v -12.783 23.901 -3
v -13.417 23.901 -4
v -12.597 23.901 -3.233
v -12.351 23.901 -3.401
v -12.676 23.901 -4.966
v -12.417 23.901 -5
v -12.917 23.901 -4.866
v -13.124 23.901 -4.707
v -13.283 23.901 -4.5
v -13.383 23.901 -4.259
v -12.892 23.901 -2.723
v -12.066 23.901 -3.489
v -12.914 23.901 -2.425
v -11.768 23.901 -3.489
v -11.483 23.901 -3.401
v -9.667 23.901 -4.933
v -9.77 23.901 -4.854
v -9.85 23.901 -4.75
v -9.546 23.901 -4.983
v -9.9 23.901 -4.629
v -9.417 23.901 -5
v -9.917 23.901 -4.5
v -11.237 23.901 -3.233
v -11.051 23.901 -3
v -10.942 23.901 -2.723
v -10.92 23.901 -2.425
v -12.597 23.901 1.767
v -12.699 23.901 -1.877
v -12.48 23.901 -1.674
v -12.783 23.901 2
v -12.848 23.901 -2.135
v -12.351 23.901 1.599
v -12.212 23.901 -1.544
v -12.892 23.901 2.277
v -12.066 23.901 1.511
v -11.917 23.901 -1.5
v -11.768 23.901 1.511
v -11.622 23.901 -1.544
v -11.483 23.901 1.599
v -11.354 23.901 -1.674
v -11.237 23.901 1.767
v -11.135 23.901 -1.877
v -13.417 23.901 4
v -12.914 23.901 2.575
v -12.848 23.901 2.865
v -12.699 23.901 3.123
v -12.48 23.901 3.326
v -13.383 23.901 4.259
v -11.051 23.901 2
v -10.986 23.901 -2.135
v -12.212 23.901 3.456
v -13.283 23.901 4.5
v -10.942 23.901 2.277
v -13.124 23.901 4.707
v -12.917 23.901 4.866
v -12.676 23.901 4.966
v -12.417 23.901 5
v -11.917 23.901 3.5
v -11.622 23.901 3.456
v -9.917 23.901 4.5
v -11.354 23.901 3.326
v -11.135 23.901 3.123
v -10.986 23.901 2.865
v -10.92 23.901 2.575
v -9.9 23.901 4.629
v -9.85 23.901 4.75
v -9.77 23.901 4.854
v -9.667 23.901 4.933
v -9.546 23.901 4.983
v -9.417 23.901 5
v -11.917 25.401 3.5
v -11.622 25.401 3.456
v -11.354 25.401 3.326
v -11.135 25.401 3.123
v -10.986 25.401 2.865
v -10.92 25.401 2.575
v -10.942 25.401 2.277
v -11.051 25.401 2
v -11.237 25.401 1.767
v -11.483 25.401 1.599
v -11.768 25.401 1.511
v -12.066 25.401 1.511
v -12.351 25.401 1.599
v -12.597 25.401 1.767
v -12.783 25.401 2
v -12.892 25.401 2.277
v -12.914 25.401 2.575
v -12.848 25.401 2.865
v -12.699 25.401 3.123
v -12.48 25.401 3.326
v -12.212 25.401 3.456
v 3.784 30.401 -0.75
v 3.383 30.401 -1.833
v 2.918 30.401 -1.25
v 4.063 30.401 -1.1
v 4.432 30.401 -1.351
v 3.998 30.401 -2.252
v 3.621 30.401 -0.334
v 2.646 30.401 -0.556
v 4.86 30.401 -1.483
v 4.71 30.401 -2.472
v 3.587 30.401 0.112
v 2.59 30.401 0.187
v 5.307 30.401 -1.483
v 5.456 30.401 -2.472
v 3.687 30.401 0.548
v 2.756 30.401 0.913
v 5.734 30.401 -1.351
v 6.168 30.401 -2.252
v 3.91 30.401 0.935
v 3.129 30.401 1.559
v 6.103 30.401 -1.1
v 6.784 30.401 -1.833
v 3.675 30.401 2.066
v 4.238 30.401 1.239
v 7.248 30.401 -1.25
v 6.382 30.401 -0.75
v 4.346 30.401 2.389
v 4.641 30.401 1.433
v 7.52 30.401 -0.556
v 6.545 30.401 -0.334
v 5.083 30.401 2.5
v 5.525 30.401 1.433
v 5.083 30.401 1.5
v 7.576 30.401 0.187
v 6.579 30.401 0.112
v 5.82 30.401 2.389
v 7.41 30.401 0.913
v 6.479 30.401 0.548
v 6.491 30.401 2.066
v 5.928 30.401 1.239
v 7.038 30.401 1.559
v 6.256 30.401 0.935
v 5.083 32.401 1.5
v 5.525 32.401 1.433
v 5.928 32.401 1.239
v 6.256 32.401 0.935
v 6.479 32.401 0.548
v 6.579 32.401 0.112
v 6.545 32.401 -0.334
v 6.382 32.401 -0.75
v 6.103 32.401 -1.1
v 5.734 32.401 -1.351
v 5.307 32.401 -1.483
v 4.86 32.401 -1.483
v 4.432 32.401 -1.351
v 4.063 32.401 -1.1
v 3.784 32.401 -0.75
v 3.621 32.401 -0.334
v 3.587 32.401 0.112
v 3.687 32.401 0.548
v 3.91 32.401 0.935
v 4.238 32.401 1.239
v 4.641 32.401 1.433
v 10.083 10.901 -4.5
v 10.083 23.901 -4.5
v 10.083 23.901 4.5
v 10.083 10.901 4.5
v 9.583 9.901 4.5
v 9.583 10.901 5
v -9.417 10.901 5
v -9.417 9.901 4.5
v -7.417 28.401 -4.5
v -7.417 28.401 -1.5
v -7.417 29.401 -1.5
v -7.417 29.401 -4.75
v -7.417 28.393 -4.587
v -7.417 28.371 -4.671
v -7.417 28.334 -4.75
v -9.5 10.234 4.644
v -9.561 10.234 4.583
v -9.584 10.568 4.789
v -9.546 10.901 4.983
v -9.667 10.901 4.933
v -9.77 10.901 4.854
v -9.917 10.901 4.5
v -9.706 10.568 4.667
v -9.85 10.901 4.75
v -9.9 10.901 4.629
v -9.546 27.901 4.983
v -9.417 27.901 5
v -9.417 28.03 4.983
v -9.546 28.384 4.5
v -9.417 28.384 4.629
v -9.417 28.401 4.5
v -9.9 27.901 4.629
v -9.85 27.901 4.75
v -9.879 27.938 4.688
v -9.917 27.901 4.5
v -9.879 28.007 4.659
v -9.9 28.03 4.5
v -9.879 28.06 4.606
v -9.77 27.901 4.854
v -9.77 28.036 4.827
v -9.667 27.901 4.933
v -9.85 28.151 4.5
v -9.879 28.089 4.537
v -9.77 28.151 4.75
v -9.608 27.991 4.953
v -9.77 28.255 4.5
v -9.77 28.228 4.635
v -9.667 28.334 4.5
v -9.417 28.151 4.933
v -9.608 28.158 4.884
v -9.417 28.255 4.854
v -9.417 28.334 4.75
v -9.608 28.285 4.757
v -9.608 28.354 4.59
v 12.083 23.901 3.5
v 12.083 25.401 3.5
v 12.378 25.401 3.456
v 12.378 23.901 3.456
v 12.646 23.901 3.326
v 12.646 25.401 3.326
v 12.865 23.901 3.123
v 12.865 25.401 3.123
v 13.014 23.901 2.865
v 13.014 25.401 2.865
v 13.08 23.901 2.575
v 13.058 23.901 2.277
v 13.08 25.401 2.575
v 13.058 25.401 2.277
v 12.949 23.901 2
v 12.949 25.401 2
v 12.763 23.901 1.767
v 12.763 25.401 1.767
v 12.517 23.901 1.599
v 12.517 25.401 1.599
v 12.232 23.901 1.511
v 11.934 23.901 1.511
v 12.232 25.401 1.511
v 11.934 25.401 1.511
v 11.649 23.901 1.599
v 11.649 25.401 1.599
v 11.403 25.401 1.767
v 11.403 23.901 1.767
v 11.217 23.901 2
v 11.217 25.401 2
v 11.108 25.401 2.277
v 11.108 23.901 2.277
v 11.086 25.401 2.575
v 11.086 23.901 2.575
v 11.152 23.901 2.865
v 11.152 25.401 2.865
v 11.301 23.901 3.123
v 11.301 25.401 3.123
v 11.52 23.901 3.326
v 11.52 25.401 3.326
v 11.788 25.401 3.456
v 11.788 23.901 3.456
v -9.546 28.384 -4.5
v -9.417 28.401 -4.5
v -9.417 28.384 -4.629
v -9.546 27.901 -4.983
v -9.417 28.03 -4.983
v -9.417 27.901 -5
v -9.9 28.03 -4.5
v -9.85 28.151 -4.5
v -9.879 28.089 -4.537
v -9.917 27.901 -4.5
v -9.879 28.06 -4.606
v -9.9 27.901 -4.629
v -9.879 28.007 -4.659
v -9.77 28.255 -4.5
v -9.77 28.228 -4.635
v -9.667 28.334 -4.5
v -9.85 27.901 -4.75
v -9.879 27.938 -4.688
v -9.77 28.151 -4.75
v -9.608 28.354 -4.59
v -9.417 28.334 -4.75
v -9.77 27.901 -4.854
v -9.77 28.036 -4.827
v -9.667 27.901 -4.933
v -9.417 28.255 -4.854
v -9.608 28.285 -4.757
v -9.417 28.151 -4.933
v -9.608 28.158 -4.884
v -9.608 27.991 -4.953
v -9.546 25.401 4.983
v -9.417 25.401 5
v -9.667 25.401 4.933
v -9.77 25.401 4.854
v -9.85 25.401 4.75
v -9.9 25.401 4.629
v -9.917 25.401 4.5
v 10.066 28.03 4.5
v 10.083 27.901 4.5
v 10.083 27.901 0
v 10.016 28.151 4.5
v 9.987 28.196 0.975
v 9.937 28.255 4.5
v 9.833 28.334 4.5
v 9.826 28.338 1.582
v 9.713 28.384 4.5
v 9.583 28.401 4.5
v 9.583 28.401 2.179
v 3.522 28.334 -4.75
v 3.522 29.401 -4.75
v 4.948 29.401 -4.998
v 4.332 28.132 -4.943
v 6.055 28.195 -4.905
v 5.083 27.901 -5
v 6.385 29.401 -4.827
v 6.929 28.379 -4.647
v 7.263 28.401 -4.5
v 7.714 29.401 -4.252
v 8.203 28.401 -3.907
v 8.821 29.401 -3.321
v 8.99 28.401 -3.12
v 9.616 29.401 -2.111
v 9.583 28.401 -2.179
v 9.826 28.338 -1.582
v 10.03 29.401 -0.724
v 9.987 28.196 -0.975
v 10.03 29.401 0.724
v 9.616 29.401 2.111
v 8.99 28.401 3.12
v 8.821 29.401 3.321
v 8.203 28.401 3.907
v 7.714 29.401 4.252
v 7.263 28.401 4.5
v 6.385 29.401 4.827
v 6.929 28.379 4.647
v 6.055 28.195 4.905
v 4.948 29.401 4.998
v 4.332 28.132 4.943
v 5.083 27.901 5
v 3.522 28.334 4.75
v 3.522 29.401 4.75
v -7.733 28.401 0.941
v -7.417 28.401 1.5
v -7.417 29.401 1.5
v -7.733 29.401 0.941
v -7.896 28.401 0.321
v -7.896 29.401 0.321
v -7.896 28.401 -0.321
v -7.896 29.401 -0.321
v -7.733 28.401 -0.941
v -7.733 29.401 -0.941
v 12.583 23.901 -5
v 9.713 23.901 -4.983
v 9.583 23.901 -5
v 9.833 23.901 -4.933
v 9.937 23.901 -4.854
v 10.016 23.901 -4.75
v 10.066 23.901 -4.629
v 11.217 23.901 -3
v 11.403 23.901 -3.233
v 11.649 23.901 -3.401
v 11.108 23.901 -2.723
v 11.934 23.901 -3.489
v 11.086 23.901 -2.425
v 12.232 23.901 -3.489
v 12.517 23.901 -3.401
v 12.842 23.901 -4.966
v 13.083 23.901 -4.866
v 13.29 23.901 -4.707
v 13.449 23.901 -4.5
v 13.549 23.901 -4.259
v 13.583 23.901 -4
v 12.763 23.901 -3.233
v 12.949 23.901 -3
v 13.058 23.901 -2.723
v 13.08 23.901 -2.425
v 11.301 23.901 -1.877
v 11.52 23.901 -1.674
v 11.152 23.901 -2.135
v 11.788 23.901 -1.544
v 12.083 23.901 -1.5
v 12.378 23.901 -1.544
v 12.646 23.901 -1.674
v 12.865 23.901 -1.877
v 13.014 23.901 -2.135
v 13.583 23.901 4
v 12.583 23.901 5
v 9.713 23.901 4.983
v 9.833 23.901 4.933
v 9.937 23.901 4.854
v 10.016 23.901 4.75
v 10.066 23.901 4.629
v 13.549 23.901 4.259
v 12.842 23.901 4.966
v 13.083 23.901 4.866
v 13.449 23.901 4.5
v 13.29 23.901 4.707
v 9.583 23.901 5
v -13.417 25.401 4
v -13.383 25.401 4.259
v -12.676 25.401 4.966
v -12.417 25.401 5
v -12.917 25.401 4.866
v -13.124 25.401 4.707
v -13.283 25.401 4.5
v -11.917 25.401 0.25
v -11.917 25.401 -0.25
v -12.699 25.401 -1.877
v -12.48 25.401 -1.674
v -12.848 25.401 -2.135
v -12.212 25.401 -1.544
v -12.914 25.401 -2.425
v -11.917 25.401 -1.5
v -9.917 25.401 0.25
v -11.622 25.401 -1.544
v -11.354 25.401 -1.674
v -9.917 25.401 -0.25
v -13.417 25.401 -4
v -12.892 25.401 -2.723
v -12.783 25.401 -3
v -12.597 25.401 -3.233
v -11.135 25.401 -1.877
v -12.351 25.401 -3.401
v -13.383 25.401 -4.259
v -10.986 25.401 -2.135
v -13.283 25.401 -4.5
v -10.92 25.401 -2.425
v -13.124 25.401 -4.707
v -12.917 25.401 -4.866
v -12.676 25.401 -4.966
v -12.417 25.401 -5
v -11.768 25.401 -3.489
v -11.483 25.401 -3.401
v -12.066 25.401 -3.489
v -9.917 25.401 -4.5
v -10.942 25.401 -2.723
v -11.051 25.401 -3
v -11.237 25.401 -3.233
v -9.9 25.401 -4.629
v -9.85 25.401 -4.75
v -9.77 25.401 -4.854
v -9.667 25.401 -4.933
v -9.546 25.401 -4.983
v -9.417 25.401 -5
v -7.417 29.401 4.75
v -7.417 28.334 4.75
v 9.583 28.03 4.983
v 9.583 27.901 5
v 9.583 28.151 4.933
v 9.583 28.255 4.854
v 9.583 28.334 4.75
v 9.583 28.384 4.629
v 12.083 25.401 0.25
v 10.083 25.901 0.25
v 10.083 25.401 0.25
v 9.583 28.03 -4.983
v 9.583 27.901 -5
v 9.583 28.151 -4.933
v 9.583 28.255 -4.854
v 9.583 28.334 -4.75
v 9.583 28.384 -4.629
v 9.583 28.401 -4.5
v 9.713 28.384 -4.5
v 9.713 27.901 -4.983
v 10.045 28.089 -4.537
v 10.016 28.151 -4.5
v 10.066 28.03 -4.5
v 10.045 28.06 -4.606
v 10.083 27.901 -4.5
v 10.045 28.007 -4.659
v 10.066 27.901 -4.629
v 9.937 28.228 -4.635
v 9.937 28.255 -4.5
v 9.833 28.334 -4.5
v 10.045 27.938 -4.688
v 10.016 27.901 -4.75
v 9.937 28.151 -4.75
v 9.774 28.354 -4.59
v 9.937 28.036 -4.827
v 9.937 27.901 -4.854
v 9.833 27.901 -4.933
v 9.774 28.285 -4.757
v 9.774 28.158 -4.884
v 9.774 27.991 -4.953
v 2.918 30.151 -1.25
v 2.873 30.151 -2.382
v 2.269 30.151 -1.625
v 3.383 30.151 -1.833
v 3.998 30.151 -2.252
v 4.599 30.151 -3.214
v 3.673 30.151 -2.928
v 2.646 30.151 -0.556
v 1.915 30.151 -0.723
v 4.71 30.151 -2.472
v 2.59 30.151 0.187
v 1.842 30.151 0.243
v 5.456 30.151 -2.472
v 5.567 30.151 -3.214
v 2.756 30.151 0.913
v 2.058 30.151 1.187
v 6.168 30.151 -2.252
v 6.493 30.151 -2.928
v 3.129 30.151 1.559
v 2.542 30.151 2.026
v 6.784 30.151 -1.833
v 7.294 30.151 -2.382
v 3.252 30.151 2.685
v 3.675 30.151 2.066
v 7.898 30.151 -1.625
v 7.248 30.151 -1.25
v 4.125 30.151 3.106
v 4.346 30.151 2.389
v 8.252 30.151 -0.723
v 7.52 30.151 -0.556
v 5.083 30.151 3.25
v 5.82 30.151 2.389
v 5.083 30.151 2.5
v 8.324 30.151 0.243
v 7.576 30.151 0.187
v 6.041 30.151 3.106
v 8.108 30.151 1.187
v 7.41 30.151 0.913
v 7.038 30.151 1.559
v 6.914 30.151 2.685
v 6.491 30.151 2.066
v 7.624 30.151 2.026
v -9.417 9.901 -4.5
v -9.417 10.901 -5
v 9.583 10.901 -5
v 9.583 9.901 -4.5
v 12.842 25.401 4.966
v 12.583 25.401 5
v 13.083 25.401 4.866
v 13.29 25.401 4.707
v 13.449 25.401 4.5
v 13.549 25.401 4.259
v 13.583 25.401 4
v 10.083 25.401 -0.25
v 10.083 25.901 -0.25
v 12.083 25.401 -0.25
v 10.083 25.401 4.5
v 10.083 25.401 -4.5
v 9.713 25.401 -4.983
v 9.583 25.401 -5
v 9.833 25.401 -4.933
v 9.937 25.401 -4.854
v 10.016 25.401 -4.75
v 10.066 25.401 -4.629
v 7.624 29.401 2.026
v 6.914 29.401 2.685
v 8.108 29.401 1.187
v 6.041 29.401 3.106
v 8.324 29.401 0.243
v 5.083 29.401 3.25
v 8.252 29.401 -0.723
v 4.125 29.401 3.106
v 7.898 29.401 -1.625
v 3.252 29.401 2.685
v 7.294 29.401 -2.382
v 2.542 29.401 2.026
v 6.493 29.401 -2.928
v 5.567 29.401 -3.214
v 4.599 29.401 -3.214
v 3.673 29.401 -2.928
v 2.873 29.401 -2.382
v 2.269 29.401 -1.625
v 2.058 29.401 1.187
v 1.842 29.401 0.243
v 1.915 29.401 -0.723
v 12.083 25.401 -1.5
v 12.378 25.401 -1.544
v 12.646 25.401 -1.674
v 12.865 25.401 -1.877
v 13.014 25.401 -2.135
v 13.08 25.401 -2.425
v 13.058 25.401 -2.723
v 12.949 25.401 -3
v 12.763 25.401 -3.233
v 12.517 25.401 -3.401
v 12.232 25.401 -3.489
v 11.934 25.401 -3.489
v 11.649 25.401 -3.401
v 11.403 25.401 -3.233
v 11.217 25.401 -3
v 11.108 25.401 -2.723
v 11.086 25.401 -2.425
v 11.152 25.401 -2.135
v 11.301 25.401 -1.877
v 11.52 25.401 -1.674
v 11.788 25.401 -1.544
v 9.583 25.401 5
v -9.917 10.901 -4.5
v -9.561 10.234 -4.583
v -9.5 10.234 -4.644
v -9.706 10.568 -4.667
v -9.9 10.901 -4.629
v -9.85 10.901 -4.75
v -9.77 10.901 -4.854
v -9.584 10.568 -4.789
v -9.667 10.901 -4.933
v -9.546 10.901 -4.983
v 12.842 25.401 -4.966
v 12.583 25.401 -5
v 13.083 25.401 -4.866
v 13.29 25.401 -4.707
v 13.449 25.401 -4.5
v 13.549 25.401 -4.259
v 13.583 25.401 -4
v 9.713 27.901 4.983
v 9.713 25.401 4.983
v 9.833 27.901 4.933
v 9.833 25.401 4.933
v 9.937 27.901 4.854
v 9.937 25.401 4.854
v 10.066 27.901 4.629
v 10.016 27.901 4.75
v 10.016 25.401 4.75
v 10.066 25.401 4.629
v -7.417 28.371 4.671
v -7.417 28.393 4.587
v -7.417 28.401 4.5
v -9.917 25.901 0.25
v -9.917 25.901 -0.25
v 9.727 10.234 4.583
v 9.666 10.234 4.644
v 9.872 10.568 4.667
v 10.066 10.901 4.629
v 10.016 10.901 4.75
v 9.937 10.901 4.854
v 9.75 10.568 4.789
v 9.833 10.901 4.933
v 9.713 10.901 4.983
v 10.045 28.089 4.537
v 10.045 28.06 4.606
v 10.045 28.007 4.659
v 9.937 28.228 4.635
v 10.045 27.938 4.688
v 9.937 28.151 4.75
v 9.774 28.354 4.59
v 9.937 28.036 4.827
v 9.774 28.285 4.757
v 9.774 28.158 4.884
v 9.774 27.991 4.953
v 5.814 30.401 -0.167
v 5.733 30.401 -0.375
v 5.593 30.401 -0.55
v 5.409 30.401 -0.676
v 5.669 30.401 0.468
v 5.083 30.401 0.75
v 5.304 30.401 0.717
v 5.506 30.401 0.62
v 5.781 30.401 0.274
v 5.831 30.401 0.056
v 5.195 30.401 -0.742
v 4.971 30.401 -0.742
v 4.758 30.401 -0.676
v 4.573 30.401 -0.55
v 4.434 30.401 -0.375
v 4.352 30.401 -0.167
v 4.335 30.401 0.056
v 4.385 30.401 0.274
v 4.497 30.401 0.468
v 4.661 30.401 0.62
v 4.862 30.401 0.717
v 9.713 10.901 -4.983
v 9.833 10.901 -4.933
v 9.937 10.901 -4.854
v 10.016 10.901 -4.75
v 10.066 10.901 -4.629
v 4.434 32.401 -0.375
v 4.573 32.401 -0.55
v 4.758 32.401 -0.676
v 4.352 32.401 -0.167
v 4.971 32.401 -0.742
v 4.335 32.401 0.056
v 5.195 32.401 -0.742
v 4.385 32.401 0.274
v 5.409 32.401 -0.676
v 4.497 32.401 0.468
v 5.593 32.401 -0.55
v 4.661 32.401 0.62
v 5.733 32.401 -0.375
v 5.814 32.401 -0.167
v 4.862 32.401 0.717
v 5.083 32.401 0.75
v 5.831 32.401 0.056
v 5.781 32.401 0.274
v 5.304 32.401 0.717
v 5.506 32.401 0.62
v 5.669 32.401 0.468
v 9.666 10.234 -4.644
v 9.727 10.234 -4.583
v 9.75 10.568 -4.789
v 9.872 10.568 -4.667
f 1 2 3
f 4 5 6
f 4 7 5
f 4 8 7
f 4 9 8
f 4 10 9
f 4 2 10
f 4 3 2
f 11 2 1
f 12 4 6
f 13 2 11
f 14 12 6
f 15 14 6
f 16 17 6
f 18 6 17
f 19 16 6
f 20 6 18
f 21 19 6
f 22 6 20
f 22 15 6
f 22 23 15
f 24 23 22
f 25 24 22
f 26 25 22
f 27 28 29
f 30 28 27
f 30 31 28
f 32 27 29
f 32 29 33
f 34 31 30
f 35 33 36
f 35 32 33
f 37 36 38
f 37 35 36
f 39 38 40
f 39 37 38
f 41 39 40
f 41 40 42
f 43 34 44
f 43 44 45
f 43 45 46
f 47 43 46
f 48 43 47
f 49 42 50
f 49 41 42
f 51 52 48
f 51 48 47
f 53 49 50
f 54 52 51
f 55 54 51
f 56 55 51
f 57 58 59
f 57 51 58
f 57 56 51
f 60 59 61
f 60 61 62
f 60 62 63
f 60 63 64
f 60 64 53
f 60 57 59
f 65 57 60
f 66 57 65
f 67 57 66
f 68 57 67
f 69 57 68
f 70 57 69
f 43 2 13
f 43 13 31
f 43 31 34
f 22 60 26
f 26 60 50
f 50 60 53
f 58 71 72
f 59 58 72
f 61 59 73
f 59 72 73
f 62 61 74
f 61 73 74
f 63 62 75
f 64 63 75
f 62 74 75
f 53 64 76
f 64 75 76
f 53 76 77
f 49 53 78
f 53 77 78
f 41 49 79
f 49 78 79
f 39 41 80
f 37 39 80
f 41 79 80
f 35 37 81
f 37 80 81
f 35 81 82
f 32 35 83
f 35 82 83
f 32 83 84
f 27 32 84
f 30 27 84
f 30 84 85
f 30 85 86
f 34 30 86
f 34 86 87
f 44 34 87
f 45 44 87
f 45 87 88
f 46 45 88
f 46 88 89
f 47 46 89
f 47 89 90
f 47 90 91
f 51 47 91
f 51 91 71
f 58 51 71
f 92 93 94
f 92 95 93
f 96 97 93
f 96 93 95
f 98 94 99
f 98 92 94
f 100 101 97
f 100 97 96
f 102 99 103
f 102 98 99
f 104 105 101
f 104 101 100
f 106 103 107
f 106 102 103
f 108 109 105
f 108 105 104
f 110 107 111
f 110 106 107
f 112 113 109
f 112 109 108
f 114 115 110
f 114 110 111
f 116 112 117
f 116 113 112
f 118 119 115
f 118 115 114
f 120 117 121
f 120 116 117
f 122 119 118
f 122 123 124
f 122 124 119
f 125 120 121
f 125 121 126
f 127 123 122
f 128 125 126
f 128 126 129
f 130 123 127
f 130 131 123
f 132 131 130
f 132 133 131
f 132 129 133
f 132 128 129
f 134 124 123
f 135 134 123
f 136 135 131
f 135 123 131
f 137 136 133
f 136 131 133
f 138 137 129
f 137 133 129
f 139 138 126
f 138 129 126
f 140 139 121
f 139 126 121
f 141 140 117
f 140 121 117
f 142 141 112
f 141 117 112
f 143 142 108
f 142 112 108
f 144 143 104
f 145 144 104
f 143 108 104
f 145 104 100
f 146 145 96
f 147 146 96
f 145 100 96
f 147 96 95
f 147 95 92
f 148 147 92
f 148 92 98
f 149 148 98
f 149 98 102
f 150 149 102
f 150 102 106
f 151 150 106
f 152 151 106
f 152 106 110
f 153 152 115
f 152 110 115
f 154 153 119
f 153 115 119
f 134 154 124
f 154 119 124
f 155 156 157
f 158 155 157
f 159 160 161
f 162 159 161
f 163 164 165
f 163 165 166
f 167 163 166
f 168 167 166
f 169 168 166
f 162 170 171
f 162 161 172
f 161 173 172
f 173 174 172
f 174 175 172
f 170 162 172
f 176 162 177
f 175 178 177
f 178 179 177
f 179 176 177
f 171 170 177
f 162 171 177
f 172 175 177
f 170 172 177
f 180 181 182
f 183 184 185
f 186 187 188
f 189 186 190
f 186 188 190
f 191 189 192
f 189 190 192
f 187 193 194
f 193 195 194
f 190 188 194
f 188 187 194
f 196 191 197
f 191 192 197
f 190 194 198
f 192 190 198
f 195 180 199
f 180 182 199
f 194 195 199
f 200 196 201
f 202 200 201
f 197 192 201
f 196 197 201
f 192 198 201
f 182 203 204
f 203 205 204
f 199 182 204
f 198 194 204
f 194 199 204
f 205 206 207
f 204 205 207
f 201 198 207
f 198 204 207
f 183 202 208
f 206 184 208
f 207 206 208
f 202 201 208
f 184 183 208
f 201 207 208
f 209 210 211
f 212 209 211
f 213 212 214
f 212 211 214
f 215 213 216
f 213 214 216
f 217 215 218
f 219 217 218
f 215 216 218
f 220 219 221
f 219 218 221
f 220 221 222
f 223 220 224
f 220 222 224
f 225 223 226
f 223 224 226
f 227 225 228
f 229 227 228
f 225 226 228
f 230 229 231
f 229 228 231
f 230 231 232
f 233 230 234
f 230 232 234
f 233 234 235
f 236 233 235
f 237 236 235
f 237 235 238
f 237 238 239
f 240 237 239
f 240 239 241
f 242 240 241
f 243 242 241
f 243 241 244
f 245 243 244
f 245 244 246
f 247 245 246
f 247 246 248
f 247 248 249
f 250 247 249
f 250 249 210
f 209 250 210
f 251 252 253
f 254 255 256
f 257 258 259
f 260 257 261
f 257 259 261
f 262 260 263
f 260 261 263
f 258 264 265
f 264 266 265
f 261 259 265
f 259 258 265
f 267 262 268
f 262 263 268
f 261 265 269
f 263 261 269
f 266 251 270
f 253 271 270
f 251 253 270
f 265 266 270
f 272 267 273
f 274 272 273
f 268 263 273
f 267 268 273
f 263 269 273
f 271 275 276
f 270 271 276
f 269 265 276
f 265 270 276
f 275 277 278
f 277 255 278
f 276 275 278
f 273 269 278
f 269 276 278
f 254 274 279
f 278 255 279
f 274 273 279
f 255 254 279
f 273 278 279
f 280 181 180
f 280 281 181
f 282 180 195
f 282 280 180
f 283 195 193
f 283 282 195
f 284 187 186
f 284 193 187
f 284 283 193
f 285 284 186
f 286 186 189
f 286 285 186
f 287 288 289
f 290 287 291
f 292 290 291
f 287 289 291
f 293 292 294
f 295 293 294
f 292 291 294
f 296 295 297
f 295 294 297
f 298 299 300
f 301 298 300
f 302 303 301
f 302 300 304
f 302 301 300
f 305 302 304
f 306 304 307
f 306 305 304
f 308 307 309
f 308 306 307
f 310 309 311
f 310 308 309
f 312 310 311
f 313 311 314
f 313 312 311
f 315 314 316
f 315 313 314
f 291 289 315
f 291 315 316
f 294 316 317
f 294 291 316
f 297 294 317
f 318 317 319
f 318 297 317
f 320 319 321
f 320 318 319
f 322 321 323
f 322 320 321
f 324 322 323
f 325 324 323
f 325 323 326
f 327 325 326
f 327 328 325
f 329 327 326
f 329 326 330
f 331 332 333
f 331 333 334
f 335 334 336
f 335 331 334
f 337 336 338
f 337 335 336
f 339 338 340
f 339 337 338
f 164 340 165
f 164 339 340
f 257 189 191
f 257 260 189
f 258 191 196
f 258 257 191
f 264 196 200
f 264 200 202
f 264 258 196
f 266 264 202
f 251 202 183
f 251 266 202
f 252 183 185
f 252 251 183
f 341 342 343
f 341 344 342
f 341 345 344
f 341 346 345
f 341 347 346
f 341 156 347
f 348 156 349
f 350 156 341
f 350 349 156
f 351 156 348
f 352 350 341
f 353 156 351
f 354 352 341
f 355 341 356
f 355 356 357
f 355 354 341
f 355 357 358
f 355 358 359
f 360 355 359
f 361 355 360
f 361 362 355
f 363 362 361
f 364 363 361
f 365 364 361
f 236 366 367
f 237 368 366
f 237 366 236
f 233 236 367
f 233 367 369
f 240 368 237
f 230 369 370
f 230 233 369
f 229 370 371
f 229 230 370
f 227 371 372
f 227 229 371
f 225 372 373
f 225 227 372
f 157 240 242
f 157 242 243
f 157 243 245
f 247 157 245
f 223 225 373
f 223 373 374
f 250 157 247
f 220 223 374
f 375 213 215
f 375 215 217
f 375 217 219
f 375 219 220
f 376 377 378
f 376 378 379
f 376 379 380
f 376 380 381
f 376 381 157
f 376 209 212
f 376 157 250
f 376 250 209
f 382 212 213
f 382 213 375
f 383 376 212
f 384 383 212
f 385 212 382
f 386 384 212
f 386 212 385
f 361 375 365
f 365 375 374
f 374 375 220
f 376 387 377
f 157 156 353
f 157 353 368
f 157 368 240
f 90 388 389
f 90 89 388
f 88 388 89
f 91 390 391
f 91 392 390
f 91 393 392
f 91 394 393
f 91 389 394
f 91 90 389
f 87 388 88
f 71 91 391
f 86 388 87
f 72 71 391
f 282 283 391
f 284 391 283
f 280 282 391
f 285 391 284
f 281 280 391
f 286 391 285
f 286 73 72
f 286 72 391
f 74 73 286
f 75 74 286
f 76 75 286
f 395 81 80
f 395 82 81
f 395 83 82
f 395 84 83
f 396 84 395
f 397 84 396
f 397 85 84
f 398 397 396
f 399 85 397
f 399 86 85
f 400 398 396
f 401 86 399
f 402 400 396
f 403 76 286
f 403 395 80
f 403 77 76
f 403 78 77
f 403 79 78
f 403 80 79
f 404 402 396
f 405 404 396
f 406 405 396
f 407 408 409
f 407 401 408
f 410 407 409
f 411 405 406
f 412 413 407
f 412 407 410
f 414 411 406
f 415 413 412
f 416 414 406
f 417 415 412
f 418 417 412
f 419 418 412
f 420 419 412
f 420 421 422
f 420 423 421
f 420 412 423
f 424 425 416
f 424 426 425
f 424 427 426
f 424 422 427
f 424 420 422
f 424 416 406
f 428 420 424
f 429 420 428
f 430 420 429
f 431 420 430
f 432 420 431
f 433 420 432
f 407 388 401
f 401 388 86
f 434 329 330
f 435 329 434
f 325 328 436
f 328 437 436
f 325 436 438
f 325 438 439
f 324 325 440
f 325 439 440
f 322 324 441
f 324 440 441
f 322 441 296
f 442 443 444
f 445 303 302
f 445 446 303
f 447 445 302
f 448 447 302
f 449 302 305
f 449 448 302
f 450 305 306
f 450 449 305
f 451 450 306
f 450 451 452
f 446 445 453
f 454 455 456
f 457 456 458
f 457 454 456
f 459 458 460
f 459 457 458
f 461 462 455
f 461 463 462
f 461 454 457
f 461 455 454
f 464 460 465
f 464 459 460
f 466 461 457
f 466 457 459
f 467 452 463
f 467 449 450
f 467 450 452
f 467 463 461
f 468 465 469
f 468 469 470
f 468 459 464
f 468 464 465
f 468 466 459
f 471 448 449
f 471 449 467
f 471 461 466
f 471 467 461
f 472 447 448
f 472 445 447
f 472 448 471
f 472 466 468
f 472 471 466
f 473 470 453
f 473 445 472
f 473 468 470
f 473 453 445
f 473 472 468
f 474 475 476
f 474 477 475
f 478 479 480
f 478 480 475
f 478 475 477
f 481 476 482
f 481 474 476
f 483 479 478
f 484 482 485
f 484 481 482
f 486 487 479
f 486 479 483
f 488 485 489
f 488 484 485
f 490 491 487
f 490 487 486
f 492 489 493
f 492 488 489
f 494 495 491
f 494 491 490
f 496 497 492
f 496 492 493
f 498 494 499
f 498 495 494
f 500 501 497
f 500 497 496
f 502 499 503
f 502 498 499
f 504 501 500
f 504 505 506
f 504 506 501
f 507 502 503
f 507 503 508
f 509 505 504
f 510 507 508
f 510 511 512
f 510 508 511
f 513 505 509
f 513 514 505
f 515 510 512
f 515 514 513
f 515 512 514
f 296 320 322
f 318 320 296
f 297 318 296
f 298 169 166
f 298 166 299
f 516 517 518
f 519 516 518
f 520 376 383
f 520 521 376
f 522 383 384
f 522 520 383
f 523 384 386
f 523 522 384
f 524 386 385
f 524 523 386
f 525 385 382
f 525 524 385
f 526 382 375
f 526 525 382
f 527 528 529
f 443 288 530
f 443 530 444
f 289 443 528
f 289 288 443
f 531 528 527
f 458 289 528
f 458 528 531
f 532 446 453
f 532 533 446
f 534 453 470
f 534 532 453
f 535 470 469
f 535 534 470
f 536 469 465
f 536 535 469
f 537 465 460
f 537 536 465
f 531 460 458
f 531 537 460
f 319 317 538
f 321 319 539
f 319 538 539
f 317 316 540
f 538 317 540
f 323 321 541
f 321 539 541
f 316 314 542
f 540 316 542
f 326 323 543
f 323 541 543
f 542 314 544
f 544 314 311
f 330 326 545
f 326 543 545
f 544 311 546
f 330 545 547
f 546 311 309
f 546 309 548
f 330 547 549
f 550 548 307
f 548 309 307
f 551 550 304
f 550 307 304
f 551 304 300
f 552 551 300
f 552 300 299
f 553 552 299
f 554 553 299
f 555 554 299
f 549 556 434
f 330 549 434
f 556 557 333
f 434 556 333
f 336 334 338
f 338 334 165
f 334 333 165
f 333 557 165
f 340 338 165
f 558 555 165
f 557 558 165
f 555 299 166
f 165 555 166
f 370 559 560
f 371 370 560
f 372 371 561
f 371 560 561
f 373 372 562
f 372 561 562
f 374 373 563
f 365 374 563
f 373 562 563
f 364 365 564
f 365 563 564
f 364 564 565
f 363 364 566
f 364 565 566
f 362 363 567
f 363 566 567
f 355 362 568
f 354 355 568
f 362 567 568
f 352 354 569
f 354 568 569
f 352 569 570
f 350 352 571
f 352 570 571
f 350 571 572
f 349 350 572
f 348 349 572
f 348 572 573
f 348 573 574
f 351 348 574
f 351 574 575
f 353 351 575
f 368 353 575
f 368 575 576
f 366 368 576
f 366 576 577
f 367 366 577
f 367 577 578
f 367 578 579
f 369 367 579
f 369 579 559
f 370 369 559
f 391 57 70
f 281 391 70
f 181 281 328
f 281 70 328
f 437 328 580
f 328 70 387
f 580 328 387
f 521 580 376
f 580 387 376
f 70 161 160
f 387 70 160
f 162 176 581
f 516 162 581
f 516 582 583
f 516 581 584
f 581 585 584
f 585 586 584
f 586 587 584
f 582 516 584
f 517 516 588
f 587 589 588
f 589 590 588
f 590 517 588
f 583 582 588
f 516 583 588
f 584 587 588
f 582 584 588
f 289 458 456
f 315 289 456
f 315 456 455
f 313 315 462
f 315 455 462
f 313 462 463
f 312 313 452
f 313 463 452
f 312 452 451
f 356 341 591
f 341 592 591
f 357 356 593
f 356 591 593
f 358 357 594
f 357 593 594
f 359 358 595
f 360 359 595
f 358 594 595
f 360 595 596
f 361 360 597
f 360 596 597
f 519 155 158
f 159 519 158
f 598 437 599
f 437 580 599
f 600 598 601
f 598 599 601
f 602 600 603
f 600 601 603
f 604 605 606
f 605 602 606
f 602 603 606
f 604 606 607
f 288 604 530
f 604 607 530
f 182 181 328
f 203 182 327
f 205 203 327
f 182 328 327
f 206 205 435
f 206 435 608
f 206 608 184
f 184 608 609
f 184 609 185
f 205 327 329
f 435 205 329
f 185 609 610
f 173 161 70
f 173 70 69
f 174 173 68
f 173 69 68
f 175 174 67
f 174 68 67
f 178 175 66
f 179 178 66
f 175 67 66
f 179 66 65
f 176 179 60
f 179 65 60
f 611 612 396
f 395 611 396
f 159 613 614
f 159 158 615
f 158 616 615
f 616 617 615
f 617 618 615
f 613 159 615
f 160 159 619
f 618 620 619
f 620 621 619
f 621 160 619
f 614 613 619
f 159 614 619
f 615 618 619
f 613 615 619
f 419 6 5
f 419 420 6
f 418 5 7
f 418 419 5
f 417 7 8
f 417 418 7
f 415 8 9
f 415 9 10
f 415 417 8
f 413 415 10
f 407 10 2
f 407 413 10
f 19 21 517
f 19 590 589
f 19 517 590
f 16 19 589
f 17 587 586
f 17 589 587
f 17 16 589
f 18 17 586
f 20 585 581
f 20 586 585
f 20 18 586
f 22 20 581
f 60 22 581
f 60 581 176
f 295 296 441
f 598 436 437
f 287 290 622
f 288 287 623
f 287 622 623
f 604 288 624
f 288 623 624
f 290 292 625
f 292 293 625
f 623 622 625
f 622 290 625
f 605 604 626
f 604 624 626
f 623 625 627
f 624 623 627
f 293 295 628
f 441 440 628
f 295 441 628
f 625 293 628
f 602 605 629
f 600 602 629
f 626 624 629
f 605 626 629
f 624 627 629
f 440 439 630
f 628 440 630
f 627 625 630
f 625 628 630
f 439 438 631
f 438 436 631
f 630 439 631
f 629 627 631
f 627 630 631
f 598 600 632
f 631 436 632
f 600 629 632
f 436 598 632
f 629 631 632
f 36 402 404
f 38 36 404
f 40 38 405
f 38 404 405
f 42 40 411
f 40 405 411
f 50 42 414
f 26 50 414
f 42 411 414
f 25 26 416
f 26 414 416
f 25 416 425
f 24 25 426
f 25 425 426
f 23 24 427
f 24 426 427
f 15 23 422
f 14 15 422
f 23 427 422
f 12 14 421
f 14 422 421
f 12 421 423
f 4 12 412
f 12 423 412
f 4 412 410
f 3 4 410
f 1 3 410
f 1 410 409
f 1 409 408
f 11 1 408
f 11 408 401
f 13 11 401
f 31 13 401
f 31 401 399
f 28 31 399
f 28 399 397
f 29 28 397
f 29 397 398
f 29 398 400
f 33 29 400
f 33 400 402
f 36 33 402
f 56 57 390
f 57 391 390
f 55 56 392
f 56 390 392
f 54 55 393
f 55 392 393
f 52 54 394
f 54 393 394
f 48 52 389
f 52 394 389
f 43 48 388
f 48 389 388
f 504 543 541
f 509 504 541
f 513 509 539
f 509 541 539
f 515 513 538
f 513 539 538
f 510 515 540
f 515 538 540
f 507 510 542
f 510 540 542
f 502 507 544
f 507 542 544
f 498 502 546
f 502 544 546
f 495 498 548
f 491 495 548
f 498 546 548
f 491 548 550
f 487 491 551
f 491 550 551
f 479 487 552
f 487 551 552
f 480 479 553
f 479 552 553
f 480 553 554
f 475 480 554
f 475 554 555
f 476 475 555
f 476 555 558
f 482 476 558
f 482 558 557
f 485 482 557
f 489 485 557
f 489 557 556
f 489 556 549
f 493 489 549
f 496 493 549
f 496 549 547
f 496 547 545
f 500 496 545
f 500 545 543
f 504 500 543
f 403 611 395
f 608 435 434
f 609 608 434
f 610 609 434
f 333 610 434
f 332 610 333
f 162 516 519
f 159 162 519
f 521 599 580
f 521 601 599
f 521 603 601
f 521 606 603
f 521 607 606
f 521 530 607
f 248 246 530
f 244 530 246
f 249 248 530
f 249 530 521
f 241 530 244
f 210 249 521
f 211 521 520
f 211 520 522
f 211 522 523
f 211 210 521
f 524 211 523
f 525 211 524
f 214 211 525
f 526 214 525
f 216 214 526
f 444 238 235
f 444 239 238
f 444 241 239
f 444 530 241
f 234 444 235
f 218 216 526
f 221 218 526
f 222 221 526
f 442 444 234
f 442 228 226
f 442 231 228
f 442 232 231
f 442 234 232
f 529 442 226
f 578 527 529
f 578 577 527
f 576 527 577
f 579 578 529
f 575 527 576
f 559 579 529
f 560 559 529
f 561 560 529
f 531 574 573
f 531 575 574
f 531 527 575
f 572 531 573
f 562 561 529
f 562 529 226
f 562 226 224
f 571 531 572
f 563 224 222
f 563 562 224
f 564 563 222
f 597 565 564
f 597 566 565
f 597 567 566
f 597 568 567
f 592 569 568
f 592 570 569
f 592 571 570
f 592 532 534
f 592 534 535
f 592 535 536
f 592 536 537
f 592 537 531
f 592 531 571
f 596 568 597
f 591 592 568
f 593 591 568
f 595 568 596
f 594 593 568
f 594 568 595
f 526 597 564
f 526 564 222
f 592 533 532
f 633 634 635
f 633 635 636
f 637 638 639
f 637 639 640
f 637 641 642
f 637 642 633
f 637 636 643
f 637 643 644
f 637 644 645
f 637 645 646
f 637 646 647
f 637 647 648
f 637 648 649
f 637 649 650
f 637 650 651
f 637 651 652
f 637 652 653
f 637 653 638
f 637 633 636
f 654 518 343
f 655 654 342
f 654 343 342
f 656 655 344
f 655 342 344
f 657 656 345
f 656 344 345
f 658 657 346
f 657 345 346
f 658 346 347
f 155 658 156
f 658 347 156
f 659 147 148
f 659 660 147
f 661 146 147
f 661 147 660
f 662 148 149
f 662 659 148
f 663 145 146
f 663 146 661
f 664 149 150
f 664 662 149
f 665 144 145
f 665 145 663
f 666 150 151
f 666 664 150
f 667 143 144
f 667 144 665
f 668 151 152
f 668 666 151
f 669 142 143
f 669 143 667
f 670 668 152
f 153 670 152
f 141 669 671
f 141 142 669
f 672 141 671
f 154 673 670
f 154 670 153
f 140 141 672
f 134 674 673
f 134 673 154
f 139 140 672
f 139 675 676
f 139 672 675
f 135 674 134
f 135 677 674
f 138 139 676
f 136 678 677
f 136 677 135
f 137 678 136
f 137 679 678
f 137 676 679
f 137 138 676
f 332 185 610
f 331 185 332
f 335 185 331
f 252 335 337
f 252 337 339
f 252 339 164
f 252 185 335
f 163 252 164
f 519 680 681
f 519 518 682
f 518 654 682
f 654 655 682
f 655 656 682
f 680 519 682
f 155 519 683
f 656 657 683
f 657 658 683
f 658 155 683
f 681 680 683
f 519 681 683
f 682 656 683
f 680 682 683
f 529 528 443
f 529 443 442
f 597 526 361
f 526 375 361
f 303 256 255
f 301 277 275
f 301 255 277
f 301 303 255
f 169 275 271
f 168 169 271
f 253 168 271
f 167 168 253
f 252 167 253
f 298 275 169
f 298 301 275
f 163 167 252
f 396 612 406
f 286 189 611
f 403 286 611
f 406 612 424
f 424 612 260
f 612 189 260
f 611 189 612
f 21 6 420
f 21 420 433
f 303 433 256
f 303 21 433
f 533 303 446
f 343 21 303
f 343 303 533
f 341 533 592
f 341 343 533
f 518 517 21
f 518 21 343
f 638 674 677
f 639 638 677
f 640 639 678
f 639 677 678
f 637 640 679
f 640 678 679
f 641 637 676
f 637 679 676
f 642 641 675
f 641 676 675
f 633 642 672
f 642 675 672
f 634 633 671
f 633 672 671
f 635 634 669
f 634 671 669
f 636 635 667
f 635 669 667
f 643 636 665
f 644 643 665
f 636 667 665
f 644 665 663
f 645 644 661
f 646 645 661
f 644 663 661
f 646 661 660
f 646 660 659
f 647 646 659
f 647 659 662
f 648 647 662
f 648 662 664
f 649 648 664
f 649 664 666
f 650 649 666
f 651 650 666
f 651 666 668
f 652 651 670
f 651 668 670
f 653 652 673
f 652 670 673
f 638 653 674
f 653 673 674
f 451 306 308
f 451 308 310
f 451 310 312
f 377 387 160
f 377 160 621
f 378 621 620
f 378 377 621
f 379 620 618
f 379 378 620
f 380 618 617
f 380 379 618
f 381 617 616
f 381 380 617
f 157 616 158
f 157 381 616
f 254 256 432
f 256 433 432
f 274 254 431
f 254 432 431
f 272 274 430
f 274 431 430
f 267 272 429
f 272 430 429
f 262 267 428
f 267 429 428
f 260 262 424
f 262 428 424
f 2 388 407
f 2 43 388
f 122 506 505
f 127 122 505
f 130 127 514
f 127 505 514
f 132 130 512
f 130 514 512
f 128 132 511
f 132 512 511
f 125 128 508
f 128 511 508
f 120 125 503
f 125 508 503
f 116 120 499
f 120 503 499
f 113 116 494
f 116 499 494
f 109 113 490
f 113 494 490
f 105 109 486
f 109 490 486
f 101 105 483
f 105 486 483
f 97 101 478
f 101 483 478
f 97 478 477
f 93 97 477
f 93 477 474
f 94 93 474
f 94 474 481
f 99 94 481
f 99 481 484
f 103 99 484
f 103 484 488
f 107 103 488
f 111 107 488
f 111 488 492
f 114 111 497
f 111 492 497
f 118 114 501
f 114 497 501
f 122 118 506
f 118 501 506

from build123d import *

# Parameters (mm, degrees)
SKETCH_1_W          = 54
SKETCH_1_H          = 20
EXTRUDE_1_DEPTH     = 37
SKETCH_2_W          = 67.922695334
SKETCH_2_H          = 39.407561178
SKETCH_2_W_2        = 40
SKETCH_2_H_2        = 20
CUT_EXTRUDE_1_DEPTH = 28
SKETCH_3_W          = 67.922695334
SKETCH_3_H          = 33.385731604
SKETCH_3_W_2        = 40
SKETCH_3_H_2        = 20
CUT_EXTRUDE_2_DEPTH = 6
FILLET_1_R          = 1
FILLET_2_R          = 2
CHAMFER_1_SIZE      = 1
CHAMFER_1_SIZE2     = 2
SKETCH_4_R          = 2
CUT_EXTRUDE_3_DEPTH = 30
RIB_1_REACH         = 48.883
SKETCH_5_WALL_W     = 99.888770984
SKETCH_5_WALL_H     = 1
EXTRUDE_START       = -1
EXTRUDE_4_DEPTH     = 3
SKETCH_9_R          = 6.5
EXTRUDE_5_DEPTH     = 2
CUT_EXTRUDE_START   = -0.5
SKETCH_10_R         = 6.5
SKETCH_10_R_2       = 5
CUT_EXTRUDE_4_DEPTH = 0.5
SKETCH_11_R         = 3
EXTRUDE_6_DEPTH     = 4
SKETCH_14_R         = 1.5
CUT_EXTRUDE_5_DEPTH = 4
SCALE_1_SCALE       = 0.5


with BuildPart() as part:
    # 草图1 → 凸台-拉伸1 (new body)
    with BuildSketch(Plane(origin=(0, 0, 0), x_dir=(1, 0, 0), z_dir=(0, 1, 0))):
        Rectangle(SKETCH_1_W, SKETCH_1_H)
    extrude(amount=EXTRUDE_1_DEPTH)

    # 草图2 → 切除-拉伸1 (cut)
    with BuildSketch(Plane.XZ):
        Rectangle(SKETCH_2_W, SKETCH_2_H)
        Rectangle(SKETCH_2_W_2, SKETCH_2_H_2, mode=Mode.SUBTRACT)
    extrude(amount=-CUT_EXTRUDE_1_DEPTH, mode=Mode.SUBTRACT)

    # 草图3 → 切除-拉伸2 (cut)
    with BuildSketch(Plane(origin=(0, 37, 0), x_dir=(1, 0, 0), z_dir=(0, 1, 0))):
        Rectangle(SKETCH_3_W, SKETCH_3_H)
        Rectangle(SKETCH_3_W_2, SKETCH_3_H_2, mode=Mode.SUBTRACT)
    extrude(amount=-CUT_EXTRUDE_2_DEPTH, mode=Mode.SUBTRACT)

    # 圆角1
    fillet_1_edges = [part.edges().sort_by_distance(p)[0] for p in [
        (20, 14, -10),
        (-20, 14, -10),
        (-20, 14, 10),
        (20, 14, 10),
        (0, 37, -10),
        (0, 37, 10),
        (20, 37, 0),
        (20, 34, 10),
        (-20, 34, 10),
        (-20, 37, 0),
        (-20, 34, -10),
        (20, 34, -10),
    ]]
    fillet(fillet_1_edges, radius=FILLET_1_R)

    # 圆角2
    fillet_2_edges = [part.edges().sort_by_distance(p)[0] for p in [
        (27, 29.5, 10),
        (-27, 29.5, 10),
        (-27, 29.5, -10),
        (27, 29.5, -10),
    ]]
    fillet(fillet_2_edges, radius=FILLET_2_R)

    # 倒角1
    chamfer_1_edges = [part.edges().sort_by_distance(p)[0] for p in [
        (0, 0, -10),
        (0, 0, 10),
        (-20, 0, 0),
        (20, 0, 0),
        (-19.707106781, 0, 9.707106781),
        (19.707106781, 0, 9.707106781),
        (19.707106781, 0, -9.707106781),
        (-19.707106781, 0, -9.707106781),
    ]]
    chamfer_1_side = [part.faces().sort_by_distance(p)[0] for p in [
        (0, 0, 0),
    ]]
    chamfer(chamfer_1_edges, length=CHAMFER_1_SIZE, length2=CHAMFER_1_SIZE2, reference=chamfer_1_side[0])

    # 草图4 → 切除-拉伸3 (cut)
    with BuildSketch(Plane(origin=(0, 37, 0), x_dir=(1, 0, 0), z_dir=(0, 1, 0))):
        with Locations(Location((-24, 5, 0), (0, 0, 270))):
            Circle(SKETCH_4_R)
        with Locations(Location((-24, -5, 0), (0, 0, 270))):
            Circle(SKETCH_4_R)
        with Locations(Location((24, -5, 0), (0, 0, 270))):
            Circle(SKETCH_4_R)
        with Locations(Location((24, 5, 0), (0, 0, 270))):
            Circle(SKETCH_4_R)
    extrude(amount=-CUT_EXTRUDE_3_DEPTH, mode=Mode.SUBTRACT)

    # 草图5 wall → 筋1 (add, up to next)
    with BuildSketch(Plane(origin=(-22, 31.5, 0), x_dir=(-0.970142500145, -0.242535625036, 0), z_dir=(0.242535625036, -0.970142500145, 0)), mode=Mode.PRIVATE) as rib_1_sk1:
        Rectangle(SKETCH_5_WALL_W, SKETCH_5_WALL_H)
    rib_1_tool1 = extrude(rib_1_sk1.sketch, amount=RIB_1_REACH, mode=Mode.PRIVATE) - part.part
    rib_1 = rib_1_tool1.solids().sort_by_distance((-22, 31.5, 0))[0]
    add(rib_1)

    # 镜向1: 筋1 across plane
    add(rib_1.mirror(Plane(origin=(0, 0, 0), x_dir=(0, 0, 1), z_dir=(1, 0, 0))))

    # 草图8 → 凸台-拉伸4 (add)
    with BuildSketch(Plane(origin=(0, 37, 0), x_dir=(1, 0, 0), z_dir=(0, 1, 0)).offset(EXTRUDE_START)):
        with BuildLine():
            Line((-15, 9.5), (6.877501001, 9.5))
            ThreePointArc((6.877501001, 9.5), (20, 0), (6.877501001, -9.5))
            Line((6.877501001, -9.5), (-15, -9.5))
            Line((-15, -9.5), (-15, -3))
            ThreePointArc((-15, -3), (-16, 0), (-15, 3))
            Line((-15, 3), (-15, 9.5))
        make_face()
    extrude(amount=EXTRUDE_4_DEPTH)

    # 草图9 → 凸台-拉伸5 (add)
    with BuildSketch(Plane(origin=(0, 39, 0), x_dir=(1, 0, 0), z_dir=(0, 1, 0))):
        with Locations(Location((10, 0, 0), (0, 0, 270))):
            Circle(SKETCH_9_R)
    extrude(amount=EXTRUDE_5_DEPTH)

    # 草图10 → 切除-拉伸4 (cut)
    with BuildSketch(Plane(origin=(0, 41, 0), x_dir=(1, 0, 0), z_dir=(0, 1, 0)).offset(CUT_EXTRUDE_START)):
        with Locations(Location((10, 0, 0), (0, 0, 270))):
            Circle(SKETCH_10_R)
        with Locations(Location((10, 0, 0), (0, 0, 270))):
            Circle(SKETCH_10_R_2, mode=Mode.SUBTRACT)
    extrude(amount=CUT_EXTRUDE_4_DEPTH, mode=Mode.SUBTRACT)

    # 草图11 → 凸台-拉伸6 (add)
    with BuildSketch(Plane(origin=(0, 41, 0), x_dir=(1, 0, 0), z_dir=(0, 1, 0))):
        with Locations(Location((10, 0, 0), (0, 0, 270))):
            Circle(SKETCH_11_R)
    extrude(amount=EXTRUDE_6_DEPTH)

    # 草图14 → 切除-拉伸5 (cut)
    with BuildSketch(Plane(origin=(0, 45, 0), x_dir=(1, 0, 0), z_dir=(0, 1, 0))):
        with Locations(Location((10, 0, 0), (0, 0, 270))):
            Circle(SKETCH_14_R)
    extrude(amount=-CUT_EXTRUDE_5_DEPTH, mode=Mode.SUBTRACT)


with BuildPart() as part_1:
    # 缩放比例1: scaled about (0.166200011, 19.802127708, 0)
    add(part.part.scale(SCALE_1_SCALE).moved(Location((0.083100006, 9.901063854, 0))))


solid = part_1.part
